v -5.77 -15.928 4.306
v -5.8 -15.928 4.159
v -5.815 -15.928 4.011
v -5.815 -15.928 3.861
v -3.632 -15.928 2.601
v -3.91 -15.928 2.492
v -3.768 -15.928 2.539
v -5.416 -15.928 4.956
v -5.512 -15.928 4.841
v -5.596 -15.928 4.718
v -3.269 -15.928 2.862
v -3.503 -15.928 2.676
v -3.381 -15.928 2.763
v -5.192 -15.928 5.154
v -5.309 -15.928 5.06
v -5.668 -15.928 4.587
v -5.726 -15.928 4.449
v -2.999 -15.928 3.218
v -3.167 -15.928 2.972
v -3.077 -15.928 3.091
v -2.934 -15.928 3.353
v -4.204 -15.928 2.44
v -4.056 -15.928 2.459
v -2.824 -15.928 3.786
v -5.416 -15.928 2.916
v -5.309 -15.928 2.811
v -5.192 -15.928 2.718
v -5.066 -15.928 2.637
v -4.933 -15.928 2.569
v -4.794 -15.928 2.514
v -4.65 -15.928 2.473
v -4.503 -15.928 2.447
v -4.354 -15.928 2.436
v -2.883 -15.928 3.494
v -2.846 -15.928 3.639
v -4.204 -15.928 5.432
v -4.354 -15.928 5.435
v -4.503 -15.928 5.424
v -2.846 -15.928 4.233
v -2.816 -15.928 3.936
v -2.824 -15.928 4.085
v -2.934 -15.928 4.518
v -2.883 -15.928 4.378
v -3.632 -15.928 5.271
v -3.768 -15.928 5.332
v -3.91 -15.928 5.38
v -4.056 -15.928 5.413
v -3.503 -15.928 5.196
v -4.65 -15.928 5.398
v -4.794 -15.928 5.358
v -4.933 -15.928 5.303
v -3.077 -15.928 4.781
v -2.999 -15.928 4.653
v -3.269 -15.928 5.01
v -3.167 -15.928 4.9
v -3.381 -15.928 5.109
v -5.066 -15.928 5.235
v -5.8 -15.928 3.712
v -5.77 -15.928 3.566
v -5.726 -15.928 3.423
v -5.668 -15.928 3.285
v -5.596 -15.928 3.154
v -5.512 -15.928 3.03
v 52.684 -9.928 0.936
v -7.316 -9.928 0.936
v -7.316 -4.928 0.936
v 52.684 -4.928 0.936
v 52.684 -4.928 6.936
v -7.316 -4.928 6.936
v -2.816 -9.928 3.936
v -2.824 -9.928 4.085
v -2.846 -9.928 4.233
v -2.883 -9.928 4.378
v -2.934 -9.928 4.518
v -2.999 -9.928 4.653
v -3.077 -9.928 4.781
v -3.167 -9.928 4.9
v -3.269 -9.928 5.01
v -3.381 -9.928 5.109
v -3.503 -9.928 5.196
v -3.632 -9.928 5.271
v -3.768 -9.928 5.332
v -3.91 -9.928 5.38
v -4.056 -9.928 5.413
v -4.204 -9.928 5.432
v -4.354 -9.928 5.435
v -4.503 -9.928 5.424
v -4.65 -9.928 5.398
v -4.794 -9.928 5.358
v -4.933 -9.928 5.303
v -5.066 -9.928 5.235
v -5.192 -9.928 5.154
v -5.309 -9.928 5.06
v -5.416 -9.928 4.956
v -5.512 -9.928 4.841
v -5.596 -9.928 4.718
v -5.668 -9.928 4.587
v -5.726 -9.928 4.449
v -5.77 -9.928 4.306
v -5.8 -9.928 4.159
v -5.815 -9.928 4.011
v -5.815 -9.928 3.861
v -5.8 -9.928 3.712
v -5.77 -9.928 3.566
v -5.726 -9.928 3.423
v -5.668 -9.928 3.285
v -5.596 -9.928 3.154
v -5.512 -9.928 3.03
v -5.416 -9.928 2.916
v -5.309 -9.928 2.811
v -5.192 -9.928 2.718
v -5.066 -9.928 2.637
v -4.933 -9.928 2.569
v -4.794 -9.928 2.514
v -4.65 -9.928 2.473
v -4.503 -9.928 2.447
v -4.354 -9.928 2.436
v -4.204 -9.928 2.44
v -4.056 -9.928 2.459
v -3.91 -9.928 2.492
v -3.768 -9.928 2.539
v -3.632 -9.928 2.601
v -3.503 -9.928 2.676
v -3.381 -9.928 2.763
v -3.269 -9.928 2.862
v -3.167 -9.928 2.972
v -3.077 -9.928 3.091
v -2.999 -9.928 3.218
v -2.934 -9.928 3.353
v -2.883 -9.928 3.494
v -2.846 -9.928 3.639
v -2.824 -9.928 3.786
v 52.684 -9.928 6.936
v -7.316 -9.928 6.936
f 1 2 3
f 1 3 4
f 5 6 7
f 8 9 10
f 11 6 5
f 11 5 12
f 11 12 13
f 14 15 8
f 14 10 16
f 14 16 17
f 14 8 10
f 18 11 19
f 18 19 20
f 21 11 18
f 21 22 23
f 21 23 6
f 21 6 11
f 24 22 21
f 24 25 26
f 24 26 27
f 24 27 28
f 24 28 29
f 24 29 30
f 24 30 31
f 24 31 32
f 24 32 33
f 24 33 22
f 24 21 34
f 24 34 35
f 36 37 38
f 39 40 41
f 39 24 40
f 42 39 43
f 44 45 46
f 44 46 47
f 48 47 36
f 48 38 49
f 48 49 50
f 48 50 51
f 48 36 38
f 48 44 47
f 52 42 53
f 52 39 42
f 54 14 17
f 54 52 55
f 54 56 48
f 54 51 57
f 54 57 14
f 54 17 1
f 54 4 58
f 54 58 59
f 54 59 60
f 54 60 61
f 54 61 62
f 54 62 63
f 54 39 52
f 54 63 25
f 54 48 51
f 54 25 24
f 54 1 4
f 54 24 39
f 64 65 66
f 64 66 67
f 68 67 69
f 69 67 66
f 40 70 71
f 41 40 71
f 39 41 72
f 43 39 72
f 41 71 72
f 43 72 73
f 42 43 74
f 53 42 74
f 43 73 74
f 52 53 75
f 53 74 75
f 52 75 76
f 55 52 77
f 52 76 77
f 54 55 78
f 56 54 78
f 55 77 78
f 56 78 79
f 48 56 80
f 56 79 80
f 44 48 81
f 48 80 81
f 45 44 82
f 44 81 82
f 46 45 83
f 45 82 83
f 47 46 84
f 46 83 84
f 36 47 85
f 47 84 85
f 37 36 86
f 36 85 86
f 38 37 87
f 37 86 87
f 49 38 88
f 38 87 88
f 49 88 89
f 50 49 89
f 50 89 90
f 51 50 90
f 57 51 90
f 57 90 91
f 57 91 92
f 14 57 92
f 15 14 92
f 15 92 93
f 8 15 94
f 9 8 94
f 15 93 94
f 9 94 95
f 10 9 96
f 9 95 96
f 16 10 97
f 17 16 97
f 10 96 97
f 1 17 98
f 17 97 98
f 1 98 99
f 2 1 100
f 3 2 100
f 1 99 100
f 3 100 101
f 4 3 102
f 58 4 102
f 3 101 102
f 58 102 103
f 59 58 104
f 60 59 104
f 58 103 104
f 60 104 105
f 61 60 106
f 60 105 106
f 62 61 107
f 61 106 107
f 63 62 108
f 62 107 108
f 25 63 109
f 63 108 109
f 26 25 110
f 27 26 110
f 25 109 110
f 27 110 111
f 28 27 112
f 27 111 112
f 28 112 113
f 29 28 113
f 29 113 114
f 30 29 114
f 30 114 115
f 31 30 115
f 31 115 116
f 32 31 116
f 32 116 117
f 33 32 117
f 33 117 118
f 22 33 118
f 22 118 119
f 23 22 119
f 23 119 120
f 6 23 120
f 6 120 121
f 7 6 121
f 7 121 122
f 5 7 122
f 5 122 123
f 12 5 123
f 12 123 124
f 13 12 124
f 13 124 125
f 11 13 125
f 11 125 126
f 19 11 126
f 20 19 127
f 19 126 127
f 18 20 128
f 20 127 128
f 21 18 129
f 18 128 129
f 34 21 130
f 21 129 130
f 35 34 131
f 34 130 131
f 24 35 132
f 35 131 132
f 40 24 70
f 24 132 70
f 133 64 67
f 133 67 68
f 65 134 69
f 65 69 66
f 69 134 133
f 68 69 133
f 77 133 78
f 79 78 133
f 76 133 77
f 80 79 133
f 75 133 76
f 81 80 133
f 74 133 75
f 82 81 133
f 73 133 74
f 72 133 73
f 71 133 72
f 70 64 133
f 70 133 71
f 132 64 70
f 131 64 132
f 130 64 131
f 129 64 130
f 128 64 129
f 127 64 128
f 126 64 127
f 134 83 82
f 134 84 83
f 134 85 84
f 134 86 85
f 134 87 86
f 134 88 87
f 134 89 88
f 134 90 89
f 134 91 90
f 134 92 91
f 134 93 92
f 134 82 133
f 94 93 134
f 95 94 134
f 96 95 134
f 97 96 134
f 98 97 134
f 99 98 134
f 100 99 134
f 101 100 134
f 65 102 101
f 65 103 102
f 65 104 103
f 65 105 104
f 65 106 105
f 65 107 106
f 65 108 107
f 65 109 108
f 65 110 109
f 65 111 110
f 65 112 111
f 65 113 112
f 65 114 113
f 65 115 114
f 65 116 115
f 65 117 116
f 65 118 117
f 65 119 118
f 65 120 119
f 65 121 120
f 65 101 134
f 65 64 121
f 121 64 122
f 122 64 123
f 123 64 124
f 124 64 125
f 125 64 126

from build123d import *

# Parameters (mm, degrees)
BOSS_EXTRUDE1_DEPTH = 5
SKETCH2_R           = 1.5
BOSS_EXTRUDE2_DEPTH = 6


with BuildPart() as part:
    # Sketch1 → Boss-Extrude1 (new body)
    with BuildSketch(Plane(origin=(0, -9.928470523, 0), x_dir=(1, 0, 0), z_dir=(0, 1, 0))):
        Polygon((52.683579598, -6.935769114), (-2.820579734, -6.935769114), (-7.316420402, -6.935769114), (-7.316420402, -0.935769114), (52.683579598, -0.935769114), align=None)
    extrude(amount=BOSS_EXTRUDE1_DEPTH)

    # Sketch2 → Boss-Extrude2 (add)
    with BuildSketch(Plane.XZ.offset(9.928470523)):
        with Locations((-4.316420402, 3.935769114)):
            Circle(SKETCH2_R)
    extrude(amount=BOSS_EXTRUDE2_DEPTH)


solid = part.part
